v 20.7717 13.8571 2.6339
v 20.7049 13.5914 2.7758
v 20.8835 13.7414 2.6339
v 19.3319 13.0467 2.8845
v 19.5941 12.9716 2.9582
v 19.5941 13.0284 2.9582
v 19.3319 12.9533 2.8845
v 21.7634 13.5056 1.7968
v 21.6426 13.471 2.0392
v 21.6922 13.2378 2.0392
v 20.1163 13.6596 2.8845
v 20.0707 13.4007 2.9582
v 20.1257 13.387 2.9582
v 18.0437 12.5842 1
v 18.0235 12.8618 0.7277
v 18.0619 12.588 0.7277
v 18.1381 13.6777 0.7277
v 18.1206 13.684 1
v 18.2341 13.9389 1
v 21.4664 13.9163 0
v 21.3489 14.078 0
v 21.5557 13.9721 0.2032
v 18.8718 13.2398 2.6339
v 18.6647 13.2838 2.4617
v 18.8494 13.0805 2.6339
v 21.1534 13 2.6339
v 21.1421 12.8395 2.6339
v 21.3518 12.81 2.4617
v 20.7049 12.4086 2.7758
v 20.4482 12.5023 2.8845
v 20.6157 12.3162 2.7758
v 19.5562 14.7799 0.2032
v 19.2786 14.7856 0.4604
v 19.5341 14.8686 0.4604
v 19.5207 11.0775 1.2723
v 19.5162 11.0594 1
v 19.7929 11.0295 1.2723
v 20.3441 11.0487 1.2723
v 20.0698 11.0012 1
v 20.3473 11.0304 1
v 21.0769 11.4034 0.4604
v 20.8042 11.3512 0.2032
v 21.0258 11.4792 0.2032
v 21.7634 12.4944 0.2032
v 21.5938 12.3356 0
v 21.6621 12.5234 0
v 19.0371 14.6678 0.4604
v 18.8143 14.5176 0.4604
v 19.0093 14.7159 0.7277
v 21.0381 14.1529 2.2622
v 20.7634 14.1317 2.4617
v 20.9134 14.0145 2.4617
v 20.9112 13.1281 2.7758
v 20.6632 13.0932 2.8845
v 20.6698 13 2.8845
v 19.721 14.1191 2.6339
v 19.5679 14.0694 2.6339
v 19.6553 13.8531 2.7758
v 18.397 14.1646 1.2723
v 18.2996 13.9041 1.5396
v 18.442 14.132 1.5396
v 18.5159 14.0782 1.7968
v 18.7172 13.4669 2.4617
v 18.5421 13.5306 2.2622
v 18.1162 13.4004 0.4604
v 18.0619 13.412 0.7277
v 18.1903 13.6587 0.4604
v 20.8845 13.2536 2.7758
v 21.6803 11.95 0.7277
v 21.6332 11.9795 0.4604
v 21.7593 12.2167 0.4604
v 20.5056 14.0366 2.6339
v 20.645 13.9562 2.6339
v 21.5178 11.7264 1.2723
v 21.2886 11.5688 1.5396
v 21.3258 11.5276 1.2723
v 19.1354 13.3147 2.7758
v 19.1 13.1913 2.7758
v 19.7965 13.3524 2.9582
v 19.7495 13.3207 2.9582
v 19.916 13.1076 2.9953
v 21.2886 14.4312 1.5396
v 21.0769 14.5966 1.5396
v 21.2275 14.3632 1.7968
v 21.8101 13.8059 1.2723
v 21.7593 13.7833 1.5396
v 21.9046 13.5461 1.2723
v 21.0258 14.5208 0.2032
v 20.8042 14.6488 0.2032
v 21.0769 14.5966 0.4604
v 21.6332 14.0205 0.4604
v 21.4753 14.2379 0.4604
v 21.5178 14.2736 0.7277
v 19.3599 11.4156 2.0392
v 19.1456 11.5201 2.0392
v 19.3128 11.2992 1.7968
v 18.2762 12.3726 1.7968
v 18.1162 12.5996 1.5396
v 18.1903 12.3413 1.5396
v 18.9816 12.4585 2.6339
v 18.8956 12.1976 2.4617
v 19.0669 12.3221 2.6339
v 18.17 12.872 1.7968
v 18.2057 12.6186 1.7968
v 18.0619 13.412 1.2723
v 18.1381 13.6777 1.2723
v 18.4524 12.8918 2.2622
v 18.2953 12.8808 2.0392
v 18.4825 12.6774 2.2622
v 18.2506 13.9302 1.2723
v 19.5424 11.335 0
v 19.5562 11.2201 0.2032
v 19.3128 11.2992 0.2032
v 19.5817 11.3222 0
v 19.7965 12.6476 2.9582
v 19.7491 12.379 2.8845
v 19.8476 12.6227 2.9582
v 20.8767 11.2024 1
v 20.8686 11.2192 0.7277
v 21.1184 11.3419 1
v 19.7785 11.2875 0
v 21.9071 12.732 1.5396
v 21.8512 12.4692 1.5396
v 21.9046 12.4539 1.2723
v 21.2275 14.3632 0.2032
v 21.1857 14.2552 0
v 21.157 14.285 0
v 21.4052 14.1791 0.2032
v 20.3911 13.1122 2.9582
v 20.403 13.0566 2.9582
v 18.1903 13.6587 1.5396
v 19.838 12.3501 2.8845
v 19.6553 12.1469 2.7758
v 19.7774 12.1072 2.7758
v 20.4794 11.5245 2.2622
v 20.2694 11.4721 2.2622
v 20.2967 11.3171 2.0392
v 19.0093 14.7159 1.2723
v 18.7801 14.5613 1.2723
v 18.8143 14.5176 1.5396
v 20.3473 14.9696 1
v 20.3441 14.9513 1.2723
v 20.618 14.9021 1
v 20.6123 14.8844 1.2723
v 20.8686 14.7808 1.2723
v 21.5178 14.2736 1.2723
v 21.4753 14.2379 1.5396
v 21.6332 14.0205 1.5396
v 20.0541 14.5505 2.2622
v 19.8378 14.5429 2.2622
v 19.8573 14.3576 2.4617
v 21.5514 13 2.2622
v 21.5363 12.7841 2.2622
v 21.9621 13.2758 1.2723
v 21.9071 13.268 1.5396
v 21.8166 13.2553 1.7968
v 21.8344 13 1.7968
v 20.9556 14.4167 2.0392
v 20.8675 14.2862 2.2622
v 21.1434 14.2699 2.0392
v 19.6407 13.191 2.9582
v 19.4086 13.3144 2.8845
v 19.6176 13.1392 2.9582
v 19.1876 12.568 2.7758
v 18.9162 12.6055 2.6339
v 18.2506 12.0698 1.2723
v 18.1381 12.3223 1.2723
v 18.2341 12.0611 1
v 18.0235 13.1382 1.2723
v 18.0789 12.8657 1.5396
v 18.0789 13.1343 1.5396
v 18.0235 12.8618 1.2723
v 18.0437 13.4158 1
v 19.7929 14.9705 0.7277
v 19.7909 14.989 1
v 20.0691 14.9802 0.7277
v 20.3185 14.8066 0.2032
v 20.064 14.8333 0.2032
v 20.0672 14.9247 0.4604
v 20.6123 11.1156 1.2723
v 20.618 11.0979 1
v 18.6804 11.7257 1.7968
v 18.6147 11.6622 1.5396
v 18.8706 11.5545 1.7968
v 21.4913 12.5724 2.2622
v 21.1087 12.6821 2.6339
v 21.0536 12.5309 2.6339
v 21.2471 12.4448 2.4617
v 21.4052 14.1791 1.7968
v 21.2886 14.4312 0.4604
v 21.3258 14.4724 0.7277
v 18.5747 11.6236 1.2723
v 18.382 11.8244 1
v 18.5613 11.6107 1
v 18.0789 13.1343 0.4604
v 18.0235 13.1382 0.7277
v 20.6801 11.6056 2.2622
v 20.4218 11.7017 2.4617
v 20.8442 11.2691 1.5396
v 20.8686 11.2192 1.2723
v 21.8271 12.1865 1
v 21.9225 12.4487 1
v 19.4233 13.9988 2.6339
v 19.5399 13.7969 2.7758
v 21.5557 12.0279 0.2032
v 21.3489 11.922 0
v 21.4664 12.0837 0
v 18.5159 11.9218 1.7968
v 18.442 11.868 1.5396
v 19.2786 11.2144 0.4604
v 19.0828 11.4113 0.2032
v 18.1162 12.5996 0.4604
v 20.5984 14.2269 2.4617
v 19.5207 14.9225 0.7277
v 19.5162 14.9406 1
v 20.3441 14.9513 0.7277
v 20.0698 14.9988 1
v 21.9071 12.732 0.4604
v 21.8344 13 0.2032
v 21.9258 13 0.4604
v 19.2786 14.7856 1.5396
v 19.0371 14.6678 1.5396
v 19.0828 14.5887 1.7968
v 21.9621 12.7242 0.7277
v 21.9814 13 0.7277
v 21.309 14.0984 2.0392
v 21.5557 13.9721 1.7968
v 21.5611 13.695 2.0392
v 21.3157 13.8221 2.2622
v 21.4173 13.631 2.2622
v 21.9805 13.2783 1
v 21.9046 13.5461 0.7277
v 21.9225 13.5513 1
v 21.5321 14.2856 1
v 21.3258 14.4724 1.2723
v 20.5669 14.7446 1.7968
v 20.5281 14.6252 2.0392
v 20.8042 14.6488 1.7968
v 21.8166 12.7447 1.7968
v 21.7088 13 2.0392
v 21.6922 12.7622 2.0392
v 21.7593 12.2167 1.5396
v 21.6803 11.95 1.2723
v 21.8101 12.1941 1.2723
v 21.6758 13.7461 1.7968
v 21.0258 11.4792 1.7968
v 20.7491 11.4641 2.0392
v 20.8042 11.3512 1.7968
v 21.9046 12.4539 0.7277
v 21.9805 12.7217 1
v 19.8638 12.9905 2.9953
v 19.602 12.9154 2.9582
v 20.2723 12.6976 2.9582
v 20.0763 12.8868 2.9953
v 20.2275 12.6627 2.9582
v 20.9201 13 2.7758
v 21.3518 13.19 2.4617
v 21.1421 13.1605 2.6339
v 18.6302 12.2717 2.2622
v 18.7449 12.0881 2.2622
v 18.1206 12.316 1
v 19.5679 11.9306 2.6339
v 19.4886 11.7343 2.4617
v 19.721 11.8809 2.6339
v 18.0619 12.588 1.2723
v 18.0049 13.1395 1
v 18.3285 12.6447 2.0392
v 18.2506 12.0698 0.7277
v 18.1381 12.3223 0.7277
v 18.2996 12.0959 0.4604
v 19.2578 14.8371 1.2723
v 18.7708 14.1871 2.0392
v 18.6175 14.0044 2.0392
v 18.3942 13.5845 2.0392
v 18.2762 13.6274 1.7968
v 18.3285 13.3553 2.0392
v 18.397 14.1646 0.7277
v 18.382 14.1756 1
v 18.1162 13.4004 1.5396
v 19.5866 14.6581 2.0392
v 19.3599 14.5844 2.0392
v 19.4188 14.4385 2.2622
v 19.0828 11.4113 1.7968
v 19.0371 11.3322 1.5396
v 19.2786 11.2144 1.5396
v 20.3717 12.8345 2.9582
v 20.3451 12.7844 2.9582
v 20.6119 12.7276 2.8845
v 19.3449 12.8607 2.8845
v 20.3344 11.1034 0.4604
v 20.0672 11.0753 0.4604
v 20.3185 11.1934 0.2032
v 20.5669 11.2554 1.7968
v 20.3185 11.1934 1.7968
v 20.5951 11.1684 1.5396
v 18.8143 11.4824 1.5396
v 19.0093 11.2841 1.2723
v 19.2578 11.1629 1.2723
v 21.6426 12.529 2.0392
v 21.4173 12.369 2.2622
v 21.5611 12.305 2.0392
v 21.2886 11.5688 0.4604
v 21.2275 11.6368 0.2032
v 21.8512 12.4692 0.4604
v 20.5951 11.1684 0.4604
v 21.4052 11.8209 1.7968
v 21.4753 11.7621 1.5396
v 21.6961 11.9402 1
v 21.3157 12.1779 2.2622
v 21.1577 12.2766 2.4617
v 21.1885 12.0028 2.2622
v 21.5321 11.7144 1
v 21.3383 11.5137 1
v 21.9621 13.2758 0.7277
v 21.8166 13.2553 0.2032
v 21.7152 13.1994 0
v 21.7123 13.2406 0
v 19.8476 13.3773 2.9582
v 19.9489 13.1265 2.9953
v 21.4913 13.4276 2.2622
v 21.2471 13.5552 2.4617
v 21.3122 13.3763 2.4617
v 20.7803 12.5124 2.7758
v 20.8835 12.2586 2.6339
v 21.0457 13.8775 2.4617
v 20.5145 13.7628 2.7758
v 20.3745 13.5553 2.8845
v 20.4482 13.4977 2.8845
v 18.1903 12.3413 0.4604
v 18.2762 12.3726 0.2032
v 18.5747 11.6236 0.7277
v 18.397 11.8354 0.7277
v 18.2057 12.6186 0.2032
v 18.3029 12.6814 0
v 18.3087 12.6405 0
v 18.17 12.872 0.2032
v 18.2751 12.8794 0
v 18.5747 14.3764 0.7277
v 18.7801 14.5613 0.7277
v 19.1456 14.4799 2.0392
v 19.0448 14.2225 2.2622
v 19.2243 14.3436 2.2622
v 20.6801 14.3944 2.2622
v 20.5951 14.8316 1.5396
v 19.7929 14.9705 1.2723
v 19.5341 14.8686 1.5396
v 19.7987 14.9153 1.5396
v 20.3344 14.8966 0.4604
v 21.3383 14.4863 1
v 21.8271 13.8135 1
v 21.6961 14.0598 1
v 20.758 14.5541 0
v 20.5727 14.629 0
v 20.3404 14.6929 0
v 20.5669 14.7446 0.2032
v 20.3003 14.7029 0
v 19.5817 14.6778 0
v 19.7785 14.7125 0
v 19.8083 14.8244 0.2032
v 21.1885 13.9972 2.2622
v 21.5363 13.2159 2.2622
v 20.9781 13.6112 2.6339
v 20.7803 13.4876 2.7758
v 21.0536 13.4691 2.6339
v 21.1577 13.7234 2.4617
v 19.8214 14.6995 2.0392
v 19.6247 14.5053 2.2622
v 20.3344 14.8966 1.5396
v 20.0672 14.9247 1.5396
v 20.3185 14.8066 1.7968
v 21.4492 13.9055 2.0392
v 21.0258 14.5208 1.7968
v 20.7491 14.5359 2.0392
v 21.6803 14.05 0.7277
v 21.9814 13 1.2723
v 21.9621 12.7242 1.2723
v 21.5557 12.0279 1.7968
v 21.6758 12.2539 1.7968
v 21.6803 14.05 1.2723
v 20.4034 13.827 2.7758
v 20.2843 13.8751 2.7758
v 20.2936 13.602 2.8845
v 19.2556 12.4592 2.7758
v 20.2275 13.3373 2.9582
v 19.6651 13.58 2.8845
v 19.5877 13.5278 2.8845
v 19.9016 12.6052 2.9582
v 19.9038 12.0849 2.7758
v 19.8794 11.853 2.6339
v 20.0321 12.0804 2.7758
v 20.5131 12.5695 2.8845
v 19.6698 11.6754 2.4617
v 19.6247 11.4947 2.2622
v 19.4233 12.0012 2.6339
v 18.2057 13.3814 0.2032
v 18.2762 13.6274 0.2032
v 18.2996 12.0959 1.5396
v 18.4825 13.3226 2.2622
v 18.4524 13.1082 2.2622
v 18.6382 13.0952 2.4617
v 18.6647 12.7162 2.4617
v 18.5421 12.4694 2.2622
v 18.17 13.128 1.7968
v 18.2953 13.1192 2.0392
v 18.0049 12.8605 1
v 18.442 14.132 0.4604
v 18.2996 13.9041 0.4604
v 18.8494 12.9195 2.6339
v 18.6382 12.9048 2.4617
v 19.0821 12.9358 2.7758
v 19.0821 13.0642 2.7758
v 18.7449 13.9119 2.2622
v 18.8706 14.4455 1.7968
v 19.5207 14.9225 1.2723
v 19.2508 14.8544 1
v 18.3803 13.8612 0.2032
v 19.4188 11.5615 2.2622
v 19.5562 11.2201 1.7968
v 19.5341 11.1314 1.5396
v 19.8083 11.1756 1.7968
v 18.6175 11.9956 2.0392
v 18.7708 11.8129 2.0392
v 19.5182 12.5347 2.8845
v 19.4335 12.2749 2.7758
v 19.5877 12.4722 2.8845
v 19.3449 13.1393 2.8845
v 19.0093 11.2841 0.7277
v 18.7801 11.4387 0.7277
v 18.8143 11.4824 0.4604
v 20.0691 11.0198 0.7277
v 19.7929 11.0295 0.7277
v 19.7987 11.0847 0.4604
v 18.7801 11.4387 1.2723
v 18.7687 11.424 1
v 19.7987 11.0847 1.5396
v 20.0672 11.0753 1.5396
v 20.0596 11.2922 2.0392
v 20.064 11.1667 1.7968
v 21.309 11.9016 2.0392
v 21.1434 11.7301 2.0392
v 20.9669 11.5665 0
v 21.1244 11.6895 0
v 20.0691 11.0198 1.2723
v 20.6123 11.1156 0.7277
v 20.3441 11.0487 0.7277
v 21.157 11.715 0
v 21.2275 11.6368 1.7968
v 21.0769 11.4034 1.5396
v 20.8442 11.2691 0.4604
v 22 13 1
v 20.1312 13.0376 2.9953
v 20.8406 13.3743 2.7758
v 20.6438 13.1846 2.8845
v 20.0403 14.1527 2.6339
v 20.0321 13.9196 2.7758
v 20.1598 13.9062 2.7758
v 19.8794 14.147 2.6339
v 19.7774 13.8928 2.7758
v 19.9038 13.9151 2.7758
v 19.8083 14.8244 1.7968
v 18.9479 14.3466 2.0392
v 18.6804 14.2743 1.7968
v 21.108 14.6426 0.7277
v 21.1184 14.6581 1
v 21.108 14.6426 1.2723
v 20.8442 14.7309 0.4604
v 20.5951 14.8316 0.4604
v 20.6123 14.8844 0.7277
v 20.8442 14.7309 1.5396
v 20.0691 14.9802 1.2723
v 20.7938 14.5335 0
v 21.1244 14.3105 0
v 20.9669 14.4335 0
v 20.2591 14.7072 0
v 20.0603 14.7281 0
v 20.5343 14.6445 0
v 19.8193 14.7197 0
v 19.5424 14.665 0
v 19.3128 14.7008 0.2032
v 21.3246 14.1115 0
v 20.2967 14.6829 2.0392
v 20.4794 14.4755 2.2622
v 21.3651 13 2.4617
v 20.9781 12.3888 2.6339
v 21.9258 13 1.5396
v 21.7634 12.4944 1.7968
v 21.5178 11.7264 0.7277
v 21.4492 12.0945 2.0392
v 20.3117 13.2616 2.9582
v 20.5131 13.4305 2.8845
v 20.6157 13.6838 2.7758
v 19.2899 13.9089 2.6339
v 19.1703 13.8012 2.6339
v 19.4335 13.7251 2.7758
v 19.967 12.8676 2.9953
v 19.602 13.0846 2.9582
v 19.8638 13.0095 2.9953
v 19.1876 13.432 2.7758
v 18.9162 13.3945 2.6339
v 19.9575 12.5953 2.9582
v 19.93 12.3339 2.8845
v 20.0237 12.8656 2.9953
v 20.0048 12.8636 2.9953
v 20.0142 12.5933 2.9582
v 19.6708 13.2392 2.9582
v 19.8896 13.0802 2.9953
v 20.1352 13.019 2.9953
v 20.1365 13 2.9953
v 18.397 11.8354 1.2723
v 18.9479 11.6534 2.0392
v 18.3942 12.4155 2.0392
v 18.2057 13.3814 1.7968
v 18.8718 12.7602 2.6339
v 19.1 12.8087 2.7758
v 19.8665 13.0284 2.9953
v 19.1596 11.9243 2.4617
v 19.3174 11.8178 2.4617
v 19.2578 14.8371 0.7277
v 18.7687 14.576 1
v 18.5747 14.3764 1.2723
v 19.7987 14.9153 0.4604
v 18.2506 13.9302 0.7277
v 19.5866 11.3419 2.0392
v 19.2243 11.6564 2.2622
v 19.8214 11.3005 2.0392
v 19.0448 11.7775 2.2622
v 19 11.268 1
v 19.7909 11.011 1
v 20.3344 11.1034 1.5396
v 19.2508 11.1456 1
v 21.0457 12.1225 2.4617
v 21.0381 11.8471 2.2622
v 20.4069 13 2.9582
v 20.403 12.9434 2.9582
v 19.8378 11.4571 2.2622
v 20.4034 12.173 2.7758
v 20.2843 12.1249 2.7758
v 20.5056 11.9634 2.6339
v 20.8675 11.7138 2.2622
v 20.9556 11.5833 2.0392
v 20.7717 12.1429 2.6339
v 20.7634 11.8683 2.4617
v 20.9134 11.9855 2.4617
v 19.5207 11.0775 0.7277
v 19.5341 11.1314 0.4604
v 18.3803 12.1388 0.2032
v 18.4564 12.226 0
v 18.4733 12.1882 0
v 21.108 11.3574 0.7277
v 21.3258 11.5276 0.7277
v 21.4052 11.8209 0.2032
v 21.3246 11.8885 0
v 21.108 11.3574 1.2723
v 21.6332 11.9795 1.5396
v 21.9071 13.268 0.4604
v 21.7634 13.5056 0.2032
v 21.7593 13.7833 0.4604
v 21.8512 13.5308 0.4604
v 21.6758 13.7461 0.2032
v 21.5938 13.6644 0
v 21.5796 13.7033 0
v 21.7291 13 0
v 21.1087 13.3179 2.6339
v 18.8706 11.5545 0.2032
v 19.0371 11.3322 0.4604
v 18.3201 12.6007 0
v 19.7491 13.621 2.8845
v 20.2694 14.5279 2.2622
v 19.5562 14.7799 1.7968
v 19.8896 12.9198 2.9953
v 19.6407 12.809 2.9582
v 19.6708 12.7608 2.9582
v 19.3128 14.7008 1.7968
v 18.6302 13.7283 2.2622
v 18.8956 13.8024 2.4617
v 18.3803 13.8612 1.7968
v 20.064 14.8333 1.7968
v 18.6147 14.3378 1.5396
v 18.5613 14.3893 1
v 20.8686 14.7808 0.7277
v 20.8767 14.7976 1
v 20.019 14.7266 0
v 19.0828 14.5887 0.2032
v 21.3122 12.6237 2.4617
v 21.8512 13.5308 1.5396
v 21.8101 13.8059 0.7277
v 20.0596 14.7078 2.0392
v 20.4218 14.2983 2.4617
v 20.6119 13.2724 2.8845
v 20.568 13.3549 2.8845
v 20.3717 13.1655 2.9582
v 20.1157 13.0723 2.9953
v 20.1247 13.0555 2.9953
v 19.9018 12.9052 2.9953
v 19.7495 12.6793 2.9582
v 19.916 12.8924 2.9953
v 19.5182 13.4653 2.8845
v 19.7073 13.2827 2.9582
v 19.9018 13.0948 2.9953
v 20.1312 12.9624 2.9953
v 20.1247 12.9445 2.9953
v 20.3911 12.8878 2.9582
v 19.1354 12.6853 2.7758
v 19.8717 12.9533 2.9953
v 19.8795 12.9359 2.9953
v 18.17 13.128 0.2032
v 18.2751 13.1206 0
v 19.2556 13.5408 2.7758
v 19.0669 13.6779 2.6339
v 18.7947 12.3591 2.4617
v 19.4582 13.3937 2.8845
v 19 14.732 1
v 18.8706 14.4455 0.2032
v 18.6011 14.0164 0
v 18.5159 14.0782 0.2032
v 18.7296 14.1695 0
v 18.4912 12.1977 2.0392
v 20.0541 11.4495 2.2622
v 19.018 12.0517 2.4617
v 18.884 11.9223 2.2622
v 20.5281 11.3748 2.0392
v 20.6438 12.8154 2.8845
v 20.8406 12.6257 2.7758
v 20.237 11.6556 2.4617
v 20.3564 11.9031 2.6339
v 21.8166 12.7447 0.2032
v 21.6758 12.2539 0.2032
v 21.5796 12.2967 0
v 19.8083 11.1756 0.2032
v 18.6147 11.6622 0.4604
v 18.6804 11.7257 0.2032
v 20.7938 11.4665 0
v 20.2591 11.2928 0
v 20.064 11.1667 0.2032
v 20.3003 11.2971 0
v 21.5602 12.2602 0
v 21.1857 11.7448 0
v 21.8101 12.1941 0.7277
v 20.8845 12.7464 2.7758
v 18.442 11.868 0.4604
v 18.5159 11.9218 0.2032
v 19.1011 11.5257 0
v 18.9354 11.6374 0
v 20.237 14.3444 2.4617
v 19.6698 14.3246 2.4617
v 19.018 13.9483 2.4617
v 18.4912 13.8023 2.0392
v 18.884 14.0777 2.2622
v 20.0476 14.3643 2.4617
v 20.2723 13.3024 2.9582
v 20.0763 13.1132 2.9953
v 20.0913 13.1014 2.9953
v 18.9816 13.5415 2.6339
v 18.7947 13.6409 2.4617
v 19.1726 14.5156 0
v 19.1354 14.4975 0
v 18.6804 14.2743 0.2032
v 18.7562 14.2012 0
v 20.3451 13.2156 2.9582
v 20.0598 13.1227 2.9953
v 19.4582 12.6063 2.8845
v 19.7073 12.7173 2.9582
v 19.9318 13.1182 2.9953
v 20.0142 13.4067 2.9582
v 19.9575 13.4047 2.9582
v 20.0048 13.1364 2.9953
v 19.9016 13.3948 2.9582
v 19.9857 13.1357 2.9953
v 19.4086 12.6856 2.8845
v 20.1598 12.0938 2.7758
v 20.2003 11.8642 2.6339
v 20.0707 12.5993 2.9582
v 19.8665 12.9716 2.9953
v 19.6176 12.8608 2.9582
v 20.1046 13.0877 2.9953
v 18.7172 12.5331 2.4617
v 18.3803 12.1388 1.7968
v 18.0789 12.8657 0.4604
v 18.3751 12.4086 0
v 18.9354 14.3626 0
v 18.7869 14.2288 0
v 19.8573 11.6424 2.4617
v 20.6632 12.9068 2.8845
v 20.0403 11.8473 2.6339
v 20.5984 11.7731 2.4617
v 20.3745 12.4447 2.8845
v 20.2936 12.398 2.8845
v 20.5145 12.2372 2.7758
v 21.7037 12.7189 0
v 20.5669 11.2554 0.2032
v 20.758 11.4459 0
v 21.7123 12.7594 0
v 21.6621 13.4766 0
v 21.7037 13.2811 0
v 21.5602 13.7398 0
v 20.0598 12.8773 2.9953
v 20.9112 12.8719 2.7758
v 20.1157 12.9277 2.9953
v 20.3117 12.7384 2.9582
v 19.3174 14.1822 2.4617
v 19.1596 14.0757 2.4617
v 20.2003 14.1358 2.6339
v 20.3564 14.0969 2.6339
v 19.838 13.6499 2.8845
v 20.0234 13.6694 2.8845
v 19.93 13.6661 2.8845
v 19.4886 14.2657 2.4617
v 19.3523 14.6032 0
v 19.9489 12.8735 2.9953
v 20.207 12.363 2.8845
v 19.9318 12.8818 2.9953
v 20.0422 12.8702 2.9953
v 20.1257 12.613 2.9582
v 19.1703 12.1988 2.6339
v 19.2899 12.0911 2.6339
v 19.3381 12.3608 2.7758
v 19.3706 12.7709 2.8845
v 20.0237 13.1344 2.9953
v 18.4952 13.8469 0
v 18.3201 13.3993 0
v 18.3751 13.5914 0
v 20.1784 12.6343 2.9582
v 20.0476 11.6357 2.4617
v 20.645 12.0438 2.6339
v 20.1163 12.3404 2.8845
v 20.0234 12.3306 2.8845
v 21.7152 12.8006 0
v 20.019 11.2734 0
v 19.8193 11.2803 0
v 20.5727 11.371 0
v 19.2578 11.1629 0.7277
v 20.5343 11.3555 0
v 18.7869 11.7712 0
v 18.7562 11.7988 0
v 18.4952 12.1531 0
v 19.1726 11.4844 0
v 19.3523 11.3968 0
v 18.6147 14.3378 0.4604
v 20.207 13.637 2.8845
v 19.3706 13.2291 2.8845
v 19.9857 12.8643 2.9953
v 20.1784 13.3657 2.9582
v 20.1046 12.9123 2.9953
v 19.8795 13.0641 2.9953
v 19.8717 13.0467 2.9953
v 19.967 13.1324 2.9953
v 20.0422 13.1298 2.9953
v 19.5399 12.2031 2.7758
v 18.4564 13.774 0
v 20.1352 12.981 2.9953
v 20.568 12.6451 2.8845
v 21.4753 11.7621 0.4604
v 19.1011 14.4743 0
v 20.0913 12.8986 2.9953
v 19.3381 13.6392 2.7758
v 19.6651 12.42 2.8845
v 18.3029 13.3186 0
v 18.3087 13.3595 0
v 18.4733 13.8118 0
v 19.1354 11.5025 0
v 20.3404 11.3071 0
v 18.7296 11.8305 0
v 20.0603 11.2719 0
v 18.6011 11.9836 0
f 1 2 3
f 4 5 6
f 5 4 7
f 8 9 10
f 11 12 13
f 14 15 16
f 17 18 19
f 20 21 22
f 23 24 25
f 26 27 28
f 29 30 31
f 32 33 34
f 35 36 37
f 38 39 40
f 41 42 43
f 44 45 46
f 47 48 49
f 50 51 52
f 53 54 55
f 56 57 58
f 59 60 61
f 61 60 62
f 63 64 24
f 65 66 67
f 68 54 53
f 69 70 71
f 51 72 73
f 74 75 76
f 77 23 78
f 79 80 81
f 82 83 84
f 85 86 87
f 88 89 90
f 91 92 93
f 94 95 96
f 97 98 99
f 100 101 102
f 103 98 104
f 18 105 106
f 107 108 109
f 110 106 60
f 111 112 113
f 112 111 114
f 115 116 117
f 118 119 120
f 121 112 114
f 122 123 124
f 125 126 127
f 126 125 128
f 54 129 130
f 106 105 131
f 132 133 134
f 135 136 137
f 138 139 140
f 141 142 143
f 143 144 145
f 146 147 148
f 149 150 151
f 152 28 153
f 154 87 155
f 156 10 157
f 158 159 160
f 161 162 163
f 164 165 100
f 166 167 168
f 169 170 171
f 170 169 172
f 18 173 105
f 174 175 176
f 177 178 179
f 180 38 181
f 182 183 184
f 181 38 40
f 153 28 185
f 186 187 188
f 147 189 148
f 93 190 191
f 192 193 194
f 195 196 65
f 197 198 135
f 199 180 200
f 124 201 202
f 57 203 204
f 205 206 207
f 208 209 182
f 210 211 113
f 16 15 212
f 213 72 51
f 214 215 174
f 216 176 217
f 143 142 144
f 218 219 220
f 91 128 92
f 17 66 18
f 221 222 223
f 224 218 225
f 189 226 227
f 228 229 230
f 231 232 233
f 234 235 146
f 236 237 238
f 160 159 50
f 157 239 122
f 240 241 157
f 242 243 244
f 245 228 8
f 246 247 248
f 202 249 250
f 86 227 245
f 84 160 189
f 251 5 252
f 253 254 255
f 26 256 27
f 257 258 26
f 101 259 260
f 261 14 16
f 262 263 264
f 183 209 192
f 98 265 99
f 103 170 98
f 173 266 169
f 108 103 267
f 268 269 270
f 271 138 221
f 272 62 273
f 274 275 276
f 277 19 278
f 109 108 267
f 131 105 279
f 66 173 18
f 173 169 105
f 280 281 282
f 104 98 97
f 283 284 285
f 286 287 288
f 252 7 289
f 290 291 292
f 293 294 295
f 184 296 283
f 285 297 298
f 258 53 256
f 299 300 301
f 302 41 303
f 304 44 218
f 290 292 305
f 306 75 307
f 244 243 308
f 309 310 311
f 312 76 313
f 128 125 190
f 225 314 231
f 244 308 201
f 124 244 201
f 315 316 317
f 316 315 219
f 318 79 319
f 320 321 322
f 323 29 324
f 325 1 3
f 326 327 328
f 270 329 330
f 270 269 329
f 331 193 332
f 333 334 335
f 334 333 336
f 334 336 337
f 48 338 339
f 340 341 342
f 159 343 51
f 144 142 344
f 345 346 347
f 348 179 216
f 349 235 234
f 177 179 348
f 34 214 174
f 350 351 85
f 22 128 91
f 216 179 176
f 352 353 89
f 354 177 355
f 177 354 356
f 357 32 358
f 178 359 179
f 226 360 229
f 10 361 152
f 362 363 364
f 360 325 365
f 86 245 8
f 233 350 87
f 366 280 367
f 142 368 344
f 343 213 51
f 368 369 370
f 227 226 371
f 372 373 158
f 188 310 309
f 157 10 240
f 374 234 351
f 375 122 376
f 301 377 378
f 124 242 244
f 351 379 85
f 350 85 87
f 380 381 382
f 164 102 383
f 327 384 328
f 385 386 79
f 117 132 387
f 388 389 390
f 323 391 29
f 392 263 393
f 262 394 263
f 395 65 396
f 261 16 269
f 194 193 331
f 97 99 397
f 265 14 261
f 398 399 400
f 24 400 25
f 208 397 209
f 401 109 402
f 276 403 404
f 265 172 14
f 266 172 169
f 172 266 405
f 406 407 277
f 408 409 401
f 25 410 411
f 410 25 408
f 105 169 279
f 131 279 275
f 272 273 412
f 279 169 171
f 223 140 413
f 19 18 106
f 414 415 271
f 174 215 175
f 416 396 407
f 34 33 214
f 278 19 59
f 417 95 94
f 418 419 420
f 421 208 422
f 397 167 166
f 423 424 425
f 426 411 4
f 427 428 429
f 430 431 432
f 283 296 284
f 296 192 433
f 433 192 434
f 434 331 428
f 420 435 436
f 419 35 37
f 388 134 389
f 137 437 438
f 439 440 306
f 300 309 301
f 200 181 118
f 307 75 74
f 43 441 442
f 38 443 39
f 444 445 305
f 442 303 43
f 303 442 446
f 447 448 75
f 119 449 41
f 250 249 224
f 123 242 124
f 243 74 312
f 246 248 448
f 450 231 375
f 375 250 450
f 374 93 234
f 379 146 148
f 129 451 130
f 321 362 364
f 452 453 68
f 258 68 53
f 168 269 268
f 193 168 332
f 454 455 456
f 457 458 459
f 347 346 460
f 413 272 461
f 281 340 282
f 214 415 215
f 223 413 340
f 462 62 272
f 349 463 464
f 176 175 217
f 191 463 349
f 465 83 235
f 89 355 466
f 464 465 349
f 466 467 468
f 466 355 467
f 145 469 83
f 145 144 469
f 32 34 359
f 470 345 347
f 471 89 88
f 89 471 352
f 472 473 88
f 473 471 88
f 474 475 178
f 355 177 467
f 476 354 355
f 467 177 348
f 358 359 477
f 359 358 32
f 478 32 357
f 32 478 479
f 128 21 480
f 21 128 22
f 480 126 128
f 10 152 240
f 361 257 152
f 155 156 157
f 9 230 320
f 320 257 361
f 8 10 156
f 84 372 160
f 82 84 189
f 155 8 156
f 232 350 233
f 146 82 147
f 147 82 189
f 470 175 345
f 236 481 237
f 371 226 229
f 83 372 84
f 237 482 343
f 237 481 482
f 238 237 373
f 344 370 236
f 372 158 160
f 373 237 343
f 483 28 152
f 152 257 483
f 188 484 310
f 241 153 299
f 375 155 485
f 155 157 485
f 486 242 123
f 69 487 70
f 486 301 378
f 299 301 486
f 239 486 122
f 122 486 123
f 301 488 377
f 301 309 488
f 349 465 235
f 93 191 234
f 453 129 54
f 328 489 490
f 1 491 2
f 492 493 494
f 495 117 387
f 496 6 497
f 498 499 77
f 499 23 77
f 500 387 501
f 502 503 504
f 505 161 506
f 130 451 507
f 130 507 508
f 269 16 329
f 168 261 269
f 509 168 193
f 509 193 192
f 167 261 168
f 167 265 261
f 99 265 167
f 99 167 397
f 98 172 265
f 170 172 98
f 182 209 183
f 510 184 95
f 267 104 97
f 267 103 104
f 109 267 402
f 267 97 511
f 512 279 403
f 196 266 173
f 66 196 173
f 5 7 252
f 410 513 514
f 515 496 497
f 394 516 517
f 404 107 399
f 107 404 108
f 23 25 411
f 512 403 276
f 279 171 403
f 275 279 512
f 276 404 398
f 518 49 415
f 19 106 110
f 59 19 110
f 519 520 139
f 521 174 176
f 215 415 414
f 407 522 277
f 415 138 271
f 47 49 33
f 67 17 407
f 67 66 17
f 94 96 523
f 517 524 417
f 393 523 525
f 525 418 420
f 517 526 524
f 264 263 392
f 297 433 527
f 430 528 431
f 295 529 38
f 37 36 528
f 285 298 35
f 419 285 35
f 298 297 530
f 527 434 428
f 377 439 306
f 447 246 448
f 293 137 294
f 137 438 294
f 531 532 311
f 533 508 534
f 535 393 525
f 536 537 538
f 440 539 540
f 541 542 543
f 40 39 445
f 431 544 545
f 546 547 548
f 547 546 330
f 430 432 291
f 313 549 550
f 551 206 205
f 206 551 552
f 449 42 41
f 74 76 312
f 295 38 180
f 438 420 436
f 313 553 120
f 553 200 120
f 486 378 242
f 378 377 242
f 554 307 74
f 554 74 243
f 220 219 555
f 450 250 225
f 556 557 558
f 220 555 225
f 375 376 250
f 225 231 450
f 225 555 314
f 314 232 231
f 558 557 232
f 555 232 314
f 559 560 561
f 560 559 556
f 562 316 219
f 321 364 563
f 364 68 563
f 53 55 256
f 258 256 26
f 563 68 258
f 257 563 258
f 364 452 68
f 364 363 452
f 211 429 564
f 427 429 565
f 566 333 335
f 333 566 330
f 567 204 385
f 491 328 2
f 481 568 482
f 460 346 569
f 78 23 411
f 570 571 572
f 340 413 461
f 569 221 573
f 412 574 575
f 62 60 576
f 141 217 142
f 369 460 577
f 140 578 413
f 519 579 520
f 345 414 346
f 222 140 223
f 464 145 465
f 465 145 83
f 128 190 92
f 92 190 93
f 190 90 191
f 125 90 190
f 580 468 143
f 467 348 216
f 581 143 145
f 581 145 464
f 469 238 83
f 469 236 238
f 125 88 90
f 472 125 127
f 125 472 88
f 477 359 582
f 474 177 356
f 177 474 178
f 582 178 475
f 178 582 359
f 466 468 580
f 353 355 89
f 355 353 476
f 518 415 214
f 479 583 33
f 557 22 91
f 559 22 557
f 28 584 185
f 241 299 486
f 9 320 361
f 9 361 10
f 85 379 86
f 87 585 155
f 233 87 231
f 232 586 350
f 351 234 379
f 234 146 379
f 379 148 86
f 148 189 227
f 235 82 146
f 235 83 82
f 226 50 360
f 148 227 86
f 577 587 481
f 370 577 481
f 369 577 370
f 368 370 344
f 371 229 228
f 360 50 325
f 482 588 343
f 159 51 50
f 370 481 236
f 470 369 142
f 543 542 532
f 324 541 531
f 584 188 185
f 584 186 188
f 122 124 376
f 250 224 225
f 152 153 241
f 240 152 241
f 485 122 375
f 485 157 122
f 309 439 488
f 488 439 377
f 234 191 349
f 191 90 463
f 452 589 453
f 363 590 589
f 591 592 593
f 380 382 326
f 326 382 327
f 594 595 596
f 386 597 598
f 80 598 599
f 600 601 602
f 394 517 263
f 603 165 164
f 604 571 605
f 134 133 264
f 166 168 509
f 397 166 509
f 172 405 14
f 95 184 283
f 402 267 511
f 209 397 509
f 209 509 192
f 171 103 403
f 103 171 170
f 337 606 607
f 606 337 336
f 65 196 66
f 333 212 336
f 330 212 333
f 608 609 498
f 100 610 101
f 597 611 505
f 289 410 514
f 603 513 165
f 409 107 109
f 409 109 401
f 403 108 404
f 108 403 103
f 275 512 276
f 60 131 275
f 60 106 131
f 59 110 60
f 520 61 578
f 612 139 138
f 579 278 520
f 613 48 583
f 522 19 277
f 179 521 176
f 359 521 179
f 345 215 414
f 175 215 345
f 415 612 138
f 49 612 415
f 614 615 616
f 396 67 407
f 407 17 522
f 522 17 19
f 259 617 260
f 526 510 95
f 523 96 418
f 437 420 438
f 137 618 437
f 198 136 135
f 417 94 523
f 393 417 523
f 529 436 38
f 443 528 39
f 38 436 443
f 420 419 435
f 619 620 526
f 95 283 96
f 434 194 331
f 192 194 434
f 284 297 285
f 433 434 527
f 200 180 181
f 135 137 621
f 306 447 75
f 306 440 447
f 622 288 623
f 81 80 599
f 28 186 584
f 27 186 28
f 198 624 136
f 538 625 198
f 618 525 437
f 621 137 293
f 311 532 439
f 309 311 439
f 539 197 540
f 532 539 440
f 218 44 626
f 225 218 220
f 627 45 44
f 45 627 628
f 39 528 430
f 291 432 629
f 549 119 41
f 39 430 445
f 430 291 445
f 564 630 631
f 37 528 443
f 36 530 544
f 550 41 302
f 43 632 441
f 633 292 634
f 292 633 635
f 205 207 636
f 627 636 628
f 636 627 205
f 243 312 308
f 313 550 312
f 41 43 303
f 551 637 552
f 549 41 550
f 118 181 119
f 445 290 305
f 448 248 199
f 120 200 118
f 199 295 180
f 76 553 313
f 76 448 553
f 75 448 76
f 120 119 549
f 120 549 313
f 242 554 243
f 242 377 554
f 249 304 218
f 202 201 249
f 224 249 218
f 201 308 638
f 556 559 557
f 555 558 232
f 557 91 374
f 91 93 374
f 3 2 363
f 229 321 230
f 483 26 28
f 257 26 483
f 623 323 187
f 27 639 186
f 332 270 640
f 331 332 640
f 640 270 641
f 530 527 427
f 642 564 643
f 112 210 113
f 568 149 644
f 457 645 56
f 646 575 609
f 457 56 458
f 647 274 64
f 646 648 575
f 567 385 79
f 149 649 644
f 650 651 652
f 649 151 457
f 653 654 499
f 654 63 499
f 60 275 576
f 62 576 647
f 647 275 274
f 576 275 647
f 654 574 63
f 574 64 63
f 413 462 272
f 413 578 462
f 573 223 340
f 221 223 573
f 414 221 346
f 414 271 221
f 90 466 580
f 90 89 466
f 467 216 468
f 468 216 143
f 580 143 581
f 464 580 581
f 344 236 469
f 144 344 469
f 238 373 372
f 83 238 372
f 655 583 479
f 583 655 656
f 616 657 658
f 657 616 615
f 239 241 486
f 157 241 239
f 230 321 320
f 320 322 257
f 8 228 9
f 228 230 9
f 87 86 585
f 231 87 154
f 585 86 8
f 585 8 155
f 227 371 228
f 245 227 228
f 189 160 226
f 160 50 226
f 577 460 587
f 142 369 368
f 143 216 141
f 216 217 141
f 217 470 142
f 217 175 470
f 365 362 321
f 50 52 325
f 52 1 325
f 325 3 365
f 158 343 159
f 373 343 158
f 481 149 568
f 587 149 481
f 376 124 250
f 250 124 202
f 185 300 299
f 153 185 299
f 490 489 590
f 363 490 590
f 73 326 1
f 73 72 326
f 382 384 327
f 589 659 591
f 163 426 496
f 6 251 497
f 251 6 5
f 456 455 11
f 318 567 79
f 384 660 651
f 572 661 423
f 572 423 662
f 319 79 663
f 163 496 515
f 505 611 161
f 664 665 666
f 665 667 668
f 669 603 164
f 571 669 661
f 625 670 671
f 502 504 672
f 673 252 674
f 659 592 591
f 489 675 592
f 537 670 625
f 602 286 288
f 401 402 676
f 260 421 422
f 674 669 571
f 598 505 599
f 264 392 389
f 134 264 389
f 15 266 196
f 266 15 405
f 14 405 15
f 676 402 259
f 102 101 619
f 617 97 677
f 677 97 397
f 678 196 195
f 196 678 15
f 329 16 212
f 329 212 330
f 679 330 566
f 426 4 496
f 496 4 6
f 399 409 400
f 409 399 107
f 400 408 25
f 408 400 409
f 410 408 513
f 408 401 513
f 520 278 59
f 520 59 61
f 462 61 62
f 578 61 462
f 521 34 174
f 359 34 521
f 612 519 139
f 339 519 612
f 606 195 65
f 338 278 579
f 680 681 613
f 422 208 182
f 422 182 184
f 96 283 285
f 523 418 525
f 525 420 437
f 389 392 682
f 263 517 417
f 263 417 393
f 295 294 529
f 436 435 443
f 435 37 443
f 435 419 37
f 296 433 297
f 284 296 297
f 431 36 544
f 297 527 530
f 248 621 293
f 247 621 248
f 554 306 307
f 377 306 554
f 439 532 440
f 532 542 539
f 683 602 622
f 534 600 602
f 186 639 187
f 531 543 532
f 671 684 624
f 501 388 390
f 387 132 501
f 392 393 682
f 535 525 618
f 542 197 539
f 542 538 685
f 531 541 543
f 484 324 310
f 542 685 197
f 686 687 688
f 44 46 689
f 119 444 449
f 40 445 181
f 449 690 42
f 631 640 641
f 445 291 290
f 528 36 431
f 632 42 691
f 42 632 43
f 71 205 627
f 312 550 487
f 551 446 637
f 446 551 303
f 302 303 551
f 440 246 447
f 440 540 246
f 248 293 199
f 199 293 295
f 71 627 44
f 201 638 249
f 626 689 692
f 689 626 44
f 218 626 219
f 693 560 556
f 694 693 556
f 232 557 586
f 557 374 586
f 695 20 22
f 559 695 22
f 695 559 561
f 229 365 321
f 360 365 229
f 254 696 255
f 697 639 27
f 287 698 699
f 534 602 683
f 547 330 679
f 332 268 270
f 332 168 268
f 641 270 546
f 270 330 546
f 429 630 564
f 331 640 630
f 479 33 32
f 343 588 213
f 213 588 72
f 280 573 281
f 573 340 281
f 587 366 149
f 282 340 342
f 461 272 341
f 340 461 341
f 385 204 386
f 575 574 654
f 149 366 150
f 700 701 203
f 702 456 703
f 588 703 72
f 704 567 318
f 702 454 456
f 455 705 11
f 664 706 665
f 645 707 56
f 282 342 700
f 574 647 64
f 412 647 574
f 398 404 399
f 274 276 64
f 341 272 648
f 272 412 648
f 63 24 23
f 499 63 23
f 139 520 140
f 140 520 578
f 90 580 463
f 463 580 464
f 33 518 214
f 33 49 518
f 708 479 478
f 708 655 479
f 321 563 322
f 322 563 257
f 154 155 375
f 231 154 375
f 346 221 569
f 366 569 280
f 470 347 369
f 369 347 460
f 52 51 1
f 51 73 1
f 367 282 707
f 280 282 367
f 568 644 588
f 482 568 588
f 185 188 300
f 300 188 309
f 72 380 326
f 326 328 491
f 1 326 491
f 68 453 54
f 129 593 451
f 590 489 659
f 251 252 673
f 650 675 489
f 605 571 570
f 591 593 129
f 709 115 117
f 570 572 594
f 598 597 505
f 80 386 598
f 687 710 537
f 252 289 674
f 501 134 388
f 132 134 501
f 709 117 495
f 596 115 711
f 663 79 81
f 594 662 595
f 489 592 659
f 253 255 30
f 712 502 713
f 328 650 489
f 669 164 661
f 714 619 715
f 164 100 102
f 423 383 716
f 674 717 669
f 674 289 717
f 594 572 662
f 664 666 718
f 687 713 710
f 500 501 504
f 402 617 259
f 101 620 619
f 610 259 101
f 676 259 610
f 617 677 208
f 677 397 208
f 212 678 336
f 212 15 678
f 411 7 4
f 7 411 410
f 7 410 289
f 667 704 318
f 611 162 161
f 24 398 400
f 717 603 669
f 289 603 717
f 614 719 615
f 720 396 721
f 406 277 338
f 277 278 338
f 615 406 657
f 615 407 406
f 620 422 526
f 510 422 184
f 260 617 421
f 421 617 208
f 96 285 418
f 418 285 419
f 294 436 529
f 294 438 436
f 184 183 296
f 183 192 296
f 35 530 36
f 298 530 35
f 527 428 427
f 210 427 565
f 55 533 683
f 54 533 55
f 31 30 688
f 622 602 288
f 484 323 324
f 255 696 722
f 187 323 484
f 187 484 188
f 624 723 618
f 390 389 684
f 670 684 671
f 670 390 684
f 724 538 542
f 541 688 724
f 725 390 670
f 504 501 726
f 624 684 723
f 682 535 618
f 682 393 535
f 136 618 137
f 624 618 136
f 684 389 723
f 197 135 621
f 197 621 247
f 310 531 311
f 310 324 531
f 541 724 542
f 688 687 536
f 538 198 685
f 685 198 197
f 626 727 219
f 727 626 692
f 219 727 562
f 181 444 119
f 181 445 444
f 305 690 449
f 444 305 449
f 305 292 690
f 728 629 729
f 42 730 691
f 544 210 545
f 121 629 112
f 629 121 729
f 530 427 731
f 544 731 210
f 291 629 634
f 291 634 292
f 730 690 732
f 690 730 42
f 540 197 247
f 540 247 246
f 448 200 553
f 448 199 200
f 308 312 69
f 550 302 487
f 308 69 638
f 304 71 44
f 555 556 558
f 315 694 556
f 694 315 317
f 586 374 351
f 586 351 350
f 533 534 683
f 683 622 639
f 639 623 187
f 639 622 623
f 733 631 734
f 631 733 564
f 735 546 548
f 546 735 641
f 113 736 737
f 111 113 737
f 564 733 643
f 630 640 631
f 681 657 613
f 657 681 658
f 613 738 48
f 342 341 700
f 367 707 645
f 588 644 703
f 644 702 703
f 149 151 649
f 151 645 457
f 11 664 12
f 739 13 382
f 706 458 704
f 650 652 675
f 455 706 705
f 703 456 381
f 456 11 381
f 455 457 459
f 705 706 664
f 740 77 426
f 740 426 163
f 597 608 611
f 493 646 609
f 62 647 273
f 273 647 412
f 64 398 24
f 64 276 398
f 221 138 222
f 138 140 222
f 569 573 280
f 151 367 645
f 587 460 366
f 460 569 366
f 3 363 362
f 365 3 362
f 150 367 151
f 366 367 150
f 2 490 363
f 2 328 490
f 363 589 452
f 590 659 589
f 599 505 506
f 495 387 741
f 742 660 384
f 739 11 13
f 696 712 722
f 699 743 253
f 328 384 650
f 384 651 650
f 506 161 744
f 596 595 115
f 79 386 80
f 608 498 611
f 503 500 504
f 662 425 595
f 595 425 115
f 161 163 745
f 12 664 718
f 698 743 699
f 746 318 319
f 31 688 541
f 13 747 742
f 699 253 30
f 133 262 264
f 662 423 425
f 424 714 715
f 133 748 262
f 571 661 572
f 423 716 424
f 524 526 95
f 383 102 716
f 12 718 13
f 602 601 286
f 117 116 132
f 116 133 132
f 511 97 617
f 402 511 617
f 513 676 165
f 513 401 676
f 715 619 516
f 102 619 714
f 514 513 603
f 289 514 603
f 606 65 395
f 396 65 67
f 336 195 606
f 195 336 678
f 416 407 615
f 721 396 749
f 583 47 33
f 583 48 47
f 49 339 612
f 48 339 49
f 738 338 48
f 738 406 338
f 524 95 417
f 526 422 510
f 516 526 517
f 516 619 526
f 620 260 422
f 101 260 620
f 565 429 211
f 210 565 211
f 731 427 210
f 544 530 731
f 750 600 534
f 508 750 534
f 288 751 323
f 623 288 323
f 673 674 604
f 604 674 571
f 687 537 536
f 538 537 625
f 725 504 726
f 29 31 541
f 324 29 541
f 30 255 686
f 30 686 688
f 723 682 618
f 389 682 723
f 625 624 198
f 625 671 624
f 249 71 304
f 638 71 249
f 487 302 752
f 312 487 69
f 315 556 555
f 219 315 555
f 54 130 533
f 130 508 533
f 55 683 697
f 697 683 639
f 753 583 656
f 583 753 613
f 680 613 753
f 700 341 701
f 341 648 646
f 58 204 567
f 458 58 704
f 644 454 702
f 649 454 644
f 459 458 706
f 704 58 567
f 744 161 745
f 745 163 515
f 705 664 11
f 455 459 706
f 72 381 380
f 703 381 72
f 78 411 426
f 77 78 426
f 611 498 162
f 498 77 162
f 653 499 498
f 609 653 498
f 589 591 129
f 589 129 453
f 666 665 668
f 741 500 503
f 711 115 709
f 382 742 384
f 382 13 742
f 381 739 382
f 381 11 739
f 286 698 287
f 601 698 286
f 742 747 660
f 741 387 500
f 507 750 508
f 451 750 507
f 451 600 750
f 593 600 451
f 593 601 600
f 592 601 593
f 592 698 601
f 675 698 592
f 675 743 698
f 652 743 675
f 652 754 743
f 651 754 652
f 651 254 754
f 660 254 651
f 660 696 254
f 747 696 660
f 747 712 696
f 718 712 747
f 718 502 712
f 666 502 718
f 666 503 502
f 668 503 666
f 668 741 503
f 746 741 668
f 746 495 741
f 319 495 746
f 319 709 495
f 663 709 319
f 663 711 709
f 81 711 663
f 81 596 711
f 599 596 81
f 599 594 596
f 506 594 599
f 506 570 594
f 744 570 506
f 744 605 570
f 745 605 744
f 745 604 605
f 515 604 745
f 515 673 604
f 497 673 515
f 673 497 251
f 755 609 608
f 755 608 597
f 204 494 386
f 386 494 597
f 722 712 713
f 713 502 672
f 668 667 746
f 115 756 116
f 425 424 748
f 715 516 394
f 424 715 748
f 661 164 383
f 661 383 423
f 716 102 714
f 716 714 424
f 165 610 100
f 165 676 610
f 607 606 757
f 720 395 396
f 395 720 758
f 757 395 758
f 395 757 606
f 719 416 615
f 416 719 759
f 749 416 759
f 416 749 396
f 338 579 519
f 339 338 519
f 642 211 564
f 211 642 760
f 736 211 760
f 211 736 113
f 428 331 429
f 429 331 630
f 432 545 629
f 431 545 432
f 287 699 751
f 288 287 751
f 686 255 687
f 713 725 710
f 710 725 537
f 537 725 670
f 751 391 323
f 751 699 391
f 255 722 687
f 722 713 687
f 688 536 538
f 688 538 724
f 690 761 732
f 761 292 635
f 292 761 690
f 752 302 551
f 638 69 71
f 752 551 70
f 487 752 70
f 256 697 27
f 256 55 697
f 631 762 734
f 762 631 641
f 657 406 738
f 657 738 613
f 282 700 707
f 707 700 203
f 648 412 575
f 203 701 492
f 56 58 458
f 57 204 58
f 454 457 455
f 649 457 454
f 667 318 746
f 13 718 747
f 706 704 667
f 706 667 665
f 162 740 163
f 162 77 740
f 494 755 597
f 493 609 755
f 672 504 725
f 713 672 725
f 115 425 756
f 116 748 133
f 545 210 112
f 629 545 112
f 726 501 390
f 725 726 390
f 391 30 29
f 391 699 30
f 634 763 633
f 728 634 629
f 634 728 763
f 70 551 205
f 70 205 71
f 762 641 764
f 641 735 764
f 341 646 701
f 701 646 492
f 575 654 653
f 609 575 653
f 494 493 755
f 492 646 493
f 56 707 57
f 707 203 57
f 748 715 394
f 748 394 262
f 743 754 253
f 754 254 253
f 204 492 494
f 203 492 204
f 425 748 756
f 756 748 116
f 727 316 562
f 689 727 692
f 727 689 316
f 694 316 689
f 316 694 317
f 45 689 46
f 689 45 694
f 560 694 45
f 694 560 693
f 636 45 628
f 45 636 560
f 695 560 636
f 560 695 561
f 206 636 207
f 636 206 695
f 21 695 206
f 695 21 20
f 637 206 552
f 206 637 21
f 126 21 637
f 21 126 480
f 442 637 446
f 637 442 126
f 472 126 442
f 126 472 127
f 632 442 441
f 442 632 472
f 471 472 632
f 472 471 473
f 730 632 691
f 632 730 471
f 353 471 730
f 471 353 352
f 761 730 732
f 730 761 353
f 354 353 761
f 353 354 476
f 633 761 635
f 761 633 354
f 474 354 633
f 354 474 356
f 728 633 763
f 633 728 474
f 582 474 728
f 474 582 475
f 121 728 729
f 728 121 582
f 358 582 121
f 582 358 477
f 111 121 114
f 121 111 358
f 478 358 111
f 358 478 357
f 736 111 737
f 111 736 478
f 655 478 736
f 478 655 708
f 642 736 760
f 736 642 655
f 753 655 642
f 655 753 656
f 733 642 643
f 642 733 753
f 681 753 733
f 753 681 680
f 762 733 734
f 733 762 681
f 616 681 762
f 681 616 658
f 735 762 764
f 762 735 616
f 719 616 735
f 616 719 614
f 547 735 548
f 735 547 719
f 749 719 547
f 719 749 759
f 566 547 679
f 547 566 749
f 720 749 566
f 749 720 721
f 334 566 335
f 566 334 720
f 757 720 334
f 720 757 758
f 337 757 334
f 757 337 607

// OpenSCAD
$fn=45;

difference() {
    translate([0, -7, 0])
    linear_extrude(height=3) scale([10, 10, 10])
    import("/home/pascal/Dropbox/3d-printing/cel-box/custom/spring.dxf");
    translate([10, 1, 0.5]) cube([20, 8, 10]);
    translate([3, 1, 1.5]) cube([34, 8, 10]);
}

translate([20, 13, 1]) 
difference() {
sphere(r=2);
translate([-3, -3, -7]) cube(6);
}
